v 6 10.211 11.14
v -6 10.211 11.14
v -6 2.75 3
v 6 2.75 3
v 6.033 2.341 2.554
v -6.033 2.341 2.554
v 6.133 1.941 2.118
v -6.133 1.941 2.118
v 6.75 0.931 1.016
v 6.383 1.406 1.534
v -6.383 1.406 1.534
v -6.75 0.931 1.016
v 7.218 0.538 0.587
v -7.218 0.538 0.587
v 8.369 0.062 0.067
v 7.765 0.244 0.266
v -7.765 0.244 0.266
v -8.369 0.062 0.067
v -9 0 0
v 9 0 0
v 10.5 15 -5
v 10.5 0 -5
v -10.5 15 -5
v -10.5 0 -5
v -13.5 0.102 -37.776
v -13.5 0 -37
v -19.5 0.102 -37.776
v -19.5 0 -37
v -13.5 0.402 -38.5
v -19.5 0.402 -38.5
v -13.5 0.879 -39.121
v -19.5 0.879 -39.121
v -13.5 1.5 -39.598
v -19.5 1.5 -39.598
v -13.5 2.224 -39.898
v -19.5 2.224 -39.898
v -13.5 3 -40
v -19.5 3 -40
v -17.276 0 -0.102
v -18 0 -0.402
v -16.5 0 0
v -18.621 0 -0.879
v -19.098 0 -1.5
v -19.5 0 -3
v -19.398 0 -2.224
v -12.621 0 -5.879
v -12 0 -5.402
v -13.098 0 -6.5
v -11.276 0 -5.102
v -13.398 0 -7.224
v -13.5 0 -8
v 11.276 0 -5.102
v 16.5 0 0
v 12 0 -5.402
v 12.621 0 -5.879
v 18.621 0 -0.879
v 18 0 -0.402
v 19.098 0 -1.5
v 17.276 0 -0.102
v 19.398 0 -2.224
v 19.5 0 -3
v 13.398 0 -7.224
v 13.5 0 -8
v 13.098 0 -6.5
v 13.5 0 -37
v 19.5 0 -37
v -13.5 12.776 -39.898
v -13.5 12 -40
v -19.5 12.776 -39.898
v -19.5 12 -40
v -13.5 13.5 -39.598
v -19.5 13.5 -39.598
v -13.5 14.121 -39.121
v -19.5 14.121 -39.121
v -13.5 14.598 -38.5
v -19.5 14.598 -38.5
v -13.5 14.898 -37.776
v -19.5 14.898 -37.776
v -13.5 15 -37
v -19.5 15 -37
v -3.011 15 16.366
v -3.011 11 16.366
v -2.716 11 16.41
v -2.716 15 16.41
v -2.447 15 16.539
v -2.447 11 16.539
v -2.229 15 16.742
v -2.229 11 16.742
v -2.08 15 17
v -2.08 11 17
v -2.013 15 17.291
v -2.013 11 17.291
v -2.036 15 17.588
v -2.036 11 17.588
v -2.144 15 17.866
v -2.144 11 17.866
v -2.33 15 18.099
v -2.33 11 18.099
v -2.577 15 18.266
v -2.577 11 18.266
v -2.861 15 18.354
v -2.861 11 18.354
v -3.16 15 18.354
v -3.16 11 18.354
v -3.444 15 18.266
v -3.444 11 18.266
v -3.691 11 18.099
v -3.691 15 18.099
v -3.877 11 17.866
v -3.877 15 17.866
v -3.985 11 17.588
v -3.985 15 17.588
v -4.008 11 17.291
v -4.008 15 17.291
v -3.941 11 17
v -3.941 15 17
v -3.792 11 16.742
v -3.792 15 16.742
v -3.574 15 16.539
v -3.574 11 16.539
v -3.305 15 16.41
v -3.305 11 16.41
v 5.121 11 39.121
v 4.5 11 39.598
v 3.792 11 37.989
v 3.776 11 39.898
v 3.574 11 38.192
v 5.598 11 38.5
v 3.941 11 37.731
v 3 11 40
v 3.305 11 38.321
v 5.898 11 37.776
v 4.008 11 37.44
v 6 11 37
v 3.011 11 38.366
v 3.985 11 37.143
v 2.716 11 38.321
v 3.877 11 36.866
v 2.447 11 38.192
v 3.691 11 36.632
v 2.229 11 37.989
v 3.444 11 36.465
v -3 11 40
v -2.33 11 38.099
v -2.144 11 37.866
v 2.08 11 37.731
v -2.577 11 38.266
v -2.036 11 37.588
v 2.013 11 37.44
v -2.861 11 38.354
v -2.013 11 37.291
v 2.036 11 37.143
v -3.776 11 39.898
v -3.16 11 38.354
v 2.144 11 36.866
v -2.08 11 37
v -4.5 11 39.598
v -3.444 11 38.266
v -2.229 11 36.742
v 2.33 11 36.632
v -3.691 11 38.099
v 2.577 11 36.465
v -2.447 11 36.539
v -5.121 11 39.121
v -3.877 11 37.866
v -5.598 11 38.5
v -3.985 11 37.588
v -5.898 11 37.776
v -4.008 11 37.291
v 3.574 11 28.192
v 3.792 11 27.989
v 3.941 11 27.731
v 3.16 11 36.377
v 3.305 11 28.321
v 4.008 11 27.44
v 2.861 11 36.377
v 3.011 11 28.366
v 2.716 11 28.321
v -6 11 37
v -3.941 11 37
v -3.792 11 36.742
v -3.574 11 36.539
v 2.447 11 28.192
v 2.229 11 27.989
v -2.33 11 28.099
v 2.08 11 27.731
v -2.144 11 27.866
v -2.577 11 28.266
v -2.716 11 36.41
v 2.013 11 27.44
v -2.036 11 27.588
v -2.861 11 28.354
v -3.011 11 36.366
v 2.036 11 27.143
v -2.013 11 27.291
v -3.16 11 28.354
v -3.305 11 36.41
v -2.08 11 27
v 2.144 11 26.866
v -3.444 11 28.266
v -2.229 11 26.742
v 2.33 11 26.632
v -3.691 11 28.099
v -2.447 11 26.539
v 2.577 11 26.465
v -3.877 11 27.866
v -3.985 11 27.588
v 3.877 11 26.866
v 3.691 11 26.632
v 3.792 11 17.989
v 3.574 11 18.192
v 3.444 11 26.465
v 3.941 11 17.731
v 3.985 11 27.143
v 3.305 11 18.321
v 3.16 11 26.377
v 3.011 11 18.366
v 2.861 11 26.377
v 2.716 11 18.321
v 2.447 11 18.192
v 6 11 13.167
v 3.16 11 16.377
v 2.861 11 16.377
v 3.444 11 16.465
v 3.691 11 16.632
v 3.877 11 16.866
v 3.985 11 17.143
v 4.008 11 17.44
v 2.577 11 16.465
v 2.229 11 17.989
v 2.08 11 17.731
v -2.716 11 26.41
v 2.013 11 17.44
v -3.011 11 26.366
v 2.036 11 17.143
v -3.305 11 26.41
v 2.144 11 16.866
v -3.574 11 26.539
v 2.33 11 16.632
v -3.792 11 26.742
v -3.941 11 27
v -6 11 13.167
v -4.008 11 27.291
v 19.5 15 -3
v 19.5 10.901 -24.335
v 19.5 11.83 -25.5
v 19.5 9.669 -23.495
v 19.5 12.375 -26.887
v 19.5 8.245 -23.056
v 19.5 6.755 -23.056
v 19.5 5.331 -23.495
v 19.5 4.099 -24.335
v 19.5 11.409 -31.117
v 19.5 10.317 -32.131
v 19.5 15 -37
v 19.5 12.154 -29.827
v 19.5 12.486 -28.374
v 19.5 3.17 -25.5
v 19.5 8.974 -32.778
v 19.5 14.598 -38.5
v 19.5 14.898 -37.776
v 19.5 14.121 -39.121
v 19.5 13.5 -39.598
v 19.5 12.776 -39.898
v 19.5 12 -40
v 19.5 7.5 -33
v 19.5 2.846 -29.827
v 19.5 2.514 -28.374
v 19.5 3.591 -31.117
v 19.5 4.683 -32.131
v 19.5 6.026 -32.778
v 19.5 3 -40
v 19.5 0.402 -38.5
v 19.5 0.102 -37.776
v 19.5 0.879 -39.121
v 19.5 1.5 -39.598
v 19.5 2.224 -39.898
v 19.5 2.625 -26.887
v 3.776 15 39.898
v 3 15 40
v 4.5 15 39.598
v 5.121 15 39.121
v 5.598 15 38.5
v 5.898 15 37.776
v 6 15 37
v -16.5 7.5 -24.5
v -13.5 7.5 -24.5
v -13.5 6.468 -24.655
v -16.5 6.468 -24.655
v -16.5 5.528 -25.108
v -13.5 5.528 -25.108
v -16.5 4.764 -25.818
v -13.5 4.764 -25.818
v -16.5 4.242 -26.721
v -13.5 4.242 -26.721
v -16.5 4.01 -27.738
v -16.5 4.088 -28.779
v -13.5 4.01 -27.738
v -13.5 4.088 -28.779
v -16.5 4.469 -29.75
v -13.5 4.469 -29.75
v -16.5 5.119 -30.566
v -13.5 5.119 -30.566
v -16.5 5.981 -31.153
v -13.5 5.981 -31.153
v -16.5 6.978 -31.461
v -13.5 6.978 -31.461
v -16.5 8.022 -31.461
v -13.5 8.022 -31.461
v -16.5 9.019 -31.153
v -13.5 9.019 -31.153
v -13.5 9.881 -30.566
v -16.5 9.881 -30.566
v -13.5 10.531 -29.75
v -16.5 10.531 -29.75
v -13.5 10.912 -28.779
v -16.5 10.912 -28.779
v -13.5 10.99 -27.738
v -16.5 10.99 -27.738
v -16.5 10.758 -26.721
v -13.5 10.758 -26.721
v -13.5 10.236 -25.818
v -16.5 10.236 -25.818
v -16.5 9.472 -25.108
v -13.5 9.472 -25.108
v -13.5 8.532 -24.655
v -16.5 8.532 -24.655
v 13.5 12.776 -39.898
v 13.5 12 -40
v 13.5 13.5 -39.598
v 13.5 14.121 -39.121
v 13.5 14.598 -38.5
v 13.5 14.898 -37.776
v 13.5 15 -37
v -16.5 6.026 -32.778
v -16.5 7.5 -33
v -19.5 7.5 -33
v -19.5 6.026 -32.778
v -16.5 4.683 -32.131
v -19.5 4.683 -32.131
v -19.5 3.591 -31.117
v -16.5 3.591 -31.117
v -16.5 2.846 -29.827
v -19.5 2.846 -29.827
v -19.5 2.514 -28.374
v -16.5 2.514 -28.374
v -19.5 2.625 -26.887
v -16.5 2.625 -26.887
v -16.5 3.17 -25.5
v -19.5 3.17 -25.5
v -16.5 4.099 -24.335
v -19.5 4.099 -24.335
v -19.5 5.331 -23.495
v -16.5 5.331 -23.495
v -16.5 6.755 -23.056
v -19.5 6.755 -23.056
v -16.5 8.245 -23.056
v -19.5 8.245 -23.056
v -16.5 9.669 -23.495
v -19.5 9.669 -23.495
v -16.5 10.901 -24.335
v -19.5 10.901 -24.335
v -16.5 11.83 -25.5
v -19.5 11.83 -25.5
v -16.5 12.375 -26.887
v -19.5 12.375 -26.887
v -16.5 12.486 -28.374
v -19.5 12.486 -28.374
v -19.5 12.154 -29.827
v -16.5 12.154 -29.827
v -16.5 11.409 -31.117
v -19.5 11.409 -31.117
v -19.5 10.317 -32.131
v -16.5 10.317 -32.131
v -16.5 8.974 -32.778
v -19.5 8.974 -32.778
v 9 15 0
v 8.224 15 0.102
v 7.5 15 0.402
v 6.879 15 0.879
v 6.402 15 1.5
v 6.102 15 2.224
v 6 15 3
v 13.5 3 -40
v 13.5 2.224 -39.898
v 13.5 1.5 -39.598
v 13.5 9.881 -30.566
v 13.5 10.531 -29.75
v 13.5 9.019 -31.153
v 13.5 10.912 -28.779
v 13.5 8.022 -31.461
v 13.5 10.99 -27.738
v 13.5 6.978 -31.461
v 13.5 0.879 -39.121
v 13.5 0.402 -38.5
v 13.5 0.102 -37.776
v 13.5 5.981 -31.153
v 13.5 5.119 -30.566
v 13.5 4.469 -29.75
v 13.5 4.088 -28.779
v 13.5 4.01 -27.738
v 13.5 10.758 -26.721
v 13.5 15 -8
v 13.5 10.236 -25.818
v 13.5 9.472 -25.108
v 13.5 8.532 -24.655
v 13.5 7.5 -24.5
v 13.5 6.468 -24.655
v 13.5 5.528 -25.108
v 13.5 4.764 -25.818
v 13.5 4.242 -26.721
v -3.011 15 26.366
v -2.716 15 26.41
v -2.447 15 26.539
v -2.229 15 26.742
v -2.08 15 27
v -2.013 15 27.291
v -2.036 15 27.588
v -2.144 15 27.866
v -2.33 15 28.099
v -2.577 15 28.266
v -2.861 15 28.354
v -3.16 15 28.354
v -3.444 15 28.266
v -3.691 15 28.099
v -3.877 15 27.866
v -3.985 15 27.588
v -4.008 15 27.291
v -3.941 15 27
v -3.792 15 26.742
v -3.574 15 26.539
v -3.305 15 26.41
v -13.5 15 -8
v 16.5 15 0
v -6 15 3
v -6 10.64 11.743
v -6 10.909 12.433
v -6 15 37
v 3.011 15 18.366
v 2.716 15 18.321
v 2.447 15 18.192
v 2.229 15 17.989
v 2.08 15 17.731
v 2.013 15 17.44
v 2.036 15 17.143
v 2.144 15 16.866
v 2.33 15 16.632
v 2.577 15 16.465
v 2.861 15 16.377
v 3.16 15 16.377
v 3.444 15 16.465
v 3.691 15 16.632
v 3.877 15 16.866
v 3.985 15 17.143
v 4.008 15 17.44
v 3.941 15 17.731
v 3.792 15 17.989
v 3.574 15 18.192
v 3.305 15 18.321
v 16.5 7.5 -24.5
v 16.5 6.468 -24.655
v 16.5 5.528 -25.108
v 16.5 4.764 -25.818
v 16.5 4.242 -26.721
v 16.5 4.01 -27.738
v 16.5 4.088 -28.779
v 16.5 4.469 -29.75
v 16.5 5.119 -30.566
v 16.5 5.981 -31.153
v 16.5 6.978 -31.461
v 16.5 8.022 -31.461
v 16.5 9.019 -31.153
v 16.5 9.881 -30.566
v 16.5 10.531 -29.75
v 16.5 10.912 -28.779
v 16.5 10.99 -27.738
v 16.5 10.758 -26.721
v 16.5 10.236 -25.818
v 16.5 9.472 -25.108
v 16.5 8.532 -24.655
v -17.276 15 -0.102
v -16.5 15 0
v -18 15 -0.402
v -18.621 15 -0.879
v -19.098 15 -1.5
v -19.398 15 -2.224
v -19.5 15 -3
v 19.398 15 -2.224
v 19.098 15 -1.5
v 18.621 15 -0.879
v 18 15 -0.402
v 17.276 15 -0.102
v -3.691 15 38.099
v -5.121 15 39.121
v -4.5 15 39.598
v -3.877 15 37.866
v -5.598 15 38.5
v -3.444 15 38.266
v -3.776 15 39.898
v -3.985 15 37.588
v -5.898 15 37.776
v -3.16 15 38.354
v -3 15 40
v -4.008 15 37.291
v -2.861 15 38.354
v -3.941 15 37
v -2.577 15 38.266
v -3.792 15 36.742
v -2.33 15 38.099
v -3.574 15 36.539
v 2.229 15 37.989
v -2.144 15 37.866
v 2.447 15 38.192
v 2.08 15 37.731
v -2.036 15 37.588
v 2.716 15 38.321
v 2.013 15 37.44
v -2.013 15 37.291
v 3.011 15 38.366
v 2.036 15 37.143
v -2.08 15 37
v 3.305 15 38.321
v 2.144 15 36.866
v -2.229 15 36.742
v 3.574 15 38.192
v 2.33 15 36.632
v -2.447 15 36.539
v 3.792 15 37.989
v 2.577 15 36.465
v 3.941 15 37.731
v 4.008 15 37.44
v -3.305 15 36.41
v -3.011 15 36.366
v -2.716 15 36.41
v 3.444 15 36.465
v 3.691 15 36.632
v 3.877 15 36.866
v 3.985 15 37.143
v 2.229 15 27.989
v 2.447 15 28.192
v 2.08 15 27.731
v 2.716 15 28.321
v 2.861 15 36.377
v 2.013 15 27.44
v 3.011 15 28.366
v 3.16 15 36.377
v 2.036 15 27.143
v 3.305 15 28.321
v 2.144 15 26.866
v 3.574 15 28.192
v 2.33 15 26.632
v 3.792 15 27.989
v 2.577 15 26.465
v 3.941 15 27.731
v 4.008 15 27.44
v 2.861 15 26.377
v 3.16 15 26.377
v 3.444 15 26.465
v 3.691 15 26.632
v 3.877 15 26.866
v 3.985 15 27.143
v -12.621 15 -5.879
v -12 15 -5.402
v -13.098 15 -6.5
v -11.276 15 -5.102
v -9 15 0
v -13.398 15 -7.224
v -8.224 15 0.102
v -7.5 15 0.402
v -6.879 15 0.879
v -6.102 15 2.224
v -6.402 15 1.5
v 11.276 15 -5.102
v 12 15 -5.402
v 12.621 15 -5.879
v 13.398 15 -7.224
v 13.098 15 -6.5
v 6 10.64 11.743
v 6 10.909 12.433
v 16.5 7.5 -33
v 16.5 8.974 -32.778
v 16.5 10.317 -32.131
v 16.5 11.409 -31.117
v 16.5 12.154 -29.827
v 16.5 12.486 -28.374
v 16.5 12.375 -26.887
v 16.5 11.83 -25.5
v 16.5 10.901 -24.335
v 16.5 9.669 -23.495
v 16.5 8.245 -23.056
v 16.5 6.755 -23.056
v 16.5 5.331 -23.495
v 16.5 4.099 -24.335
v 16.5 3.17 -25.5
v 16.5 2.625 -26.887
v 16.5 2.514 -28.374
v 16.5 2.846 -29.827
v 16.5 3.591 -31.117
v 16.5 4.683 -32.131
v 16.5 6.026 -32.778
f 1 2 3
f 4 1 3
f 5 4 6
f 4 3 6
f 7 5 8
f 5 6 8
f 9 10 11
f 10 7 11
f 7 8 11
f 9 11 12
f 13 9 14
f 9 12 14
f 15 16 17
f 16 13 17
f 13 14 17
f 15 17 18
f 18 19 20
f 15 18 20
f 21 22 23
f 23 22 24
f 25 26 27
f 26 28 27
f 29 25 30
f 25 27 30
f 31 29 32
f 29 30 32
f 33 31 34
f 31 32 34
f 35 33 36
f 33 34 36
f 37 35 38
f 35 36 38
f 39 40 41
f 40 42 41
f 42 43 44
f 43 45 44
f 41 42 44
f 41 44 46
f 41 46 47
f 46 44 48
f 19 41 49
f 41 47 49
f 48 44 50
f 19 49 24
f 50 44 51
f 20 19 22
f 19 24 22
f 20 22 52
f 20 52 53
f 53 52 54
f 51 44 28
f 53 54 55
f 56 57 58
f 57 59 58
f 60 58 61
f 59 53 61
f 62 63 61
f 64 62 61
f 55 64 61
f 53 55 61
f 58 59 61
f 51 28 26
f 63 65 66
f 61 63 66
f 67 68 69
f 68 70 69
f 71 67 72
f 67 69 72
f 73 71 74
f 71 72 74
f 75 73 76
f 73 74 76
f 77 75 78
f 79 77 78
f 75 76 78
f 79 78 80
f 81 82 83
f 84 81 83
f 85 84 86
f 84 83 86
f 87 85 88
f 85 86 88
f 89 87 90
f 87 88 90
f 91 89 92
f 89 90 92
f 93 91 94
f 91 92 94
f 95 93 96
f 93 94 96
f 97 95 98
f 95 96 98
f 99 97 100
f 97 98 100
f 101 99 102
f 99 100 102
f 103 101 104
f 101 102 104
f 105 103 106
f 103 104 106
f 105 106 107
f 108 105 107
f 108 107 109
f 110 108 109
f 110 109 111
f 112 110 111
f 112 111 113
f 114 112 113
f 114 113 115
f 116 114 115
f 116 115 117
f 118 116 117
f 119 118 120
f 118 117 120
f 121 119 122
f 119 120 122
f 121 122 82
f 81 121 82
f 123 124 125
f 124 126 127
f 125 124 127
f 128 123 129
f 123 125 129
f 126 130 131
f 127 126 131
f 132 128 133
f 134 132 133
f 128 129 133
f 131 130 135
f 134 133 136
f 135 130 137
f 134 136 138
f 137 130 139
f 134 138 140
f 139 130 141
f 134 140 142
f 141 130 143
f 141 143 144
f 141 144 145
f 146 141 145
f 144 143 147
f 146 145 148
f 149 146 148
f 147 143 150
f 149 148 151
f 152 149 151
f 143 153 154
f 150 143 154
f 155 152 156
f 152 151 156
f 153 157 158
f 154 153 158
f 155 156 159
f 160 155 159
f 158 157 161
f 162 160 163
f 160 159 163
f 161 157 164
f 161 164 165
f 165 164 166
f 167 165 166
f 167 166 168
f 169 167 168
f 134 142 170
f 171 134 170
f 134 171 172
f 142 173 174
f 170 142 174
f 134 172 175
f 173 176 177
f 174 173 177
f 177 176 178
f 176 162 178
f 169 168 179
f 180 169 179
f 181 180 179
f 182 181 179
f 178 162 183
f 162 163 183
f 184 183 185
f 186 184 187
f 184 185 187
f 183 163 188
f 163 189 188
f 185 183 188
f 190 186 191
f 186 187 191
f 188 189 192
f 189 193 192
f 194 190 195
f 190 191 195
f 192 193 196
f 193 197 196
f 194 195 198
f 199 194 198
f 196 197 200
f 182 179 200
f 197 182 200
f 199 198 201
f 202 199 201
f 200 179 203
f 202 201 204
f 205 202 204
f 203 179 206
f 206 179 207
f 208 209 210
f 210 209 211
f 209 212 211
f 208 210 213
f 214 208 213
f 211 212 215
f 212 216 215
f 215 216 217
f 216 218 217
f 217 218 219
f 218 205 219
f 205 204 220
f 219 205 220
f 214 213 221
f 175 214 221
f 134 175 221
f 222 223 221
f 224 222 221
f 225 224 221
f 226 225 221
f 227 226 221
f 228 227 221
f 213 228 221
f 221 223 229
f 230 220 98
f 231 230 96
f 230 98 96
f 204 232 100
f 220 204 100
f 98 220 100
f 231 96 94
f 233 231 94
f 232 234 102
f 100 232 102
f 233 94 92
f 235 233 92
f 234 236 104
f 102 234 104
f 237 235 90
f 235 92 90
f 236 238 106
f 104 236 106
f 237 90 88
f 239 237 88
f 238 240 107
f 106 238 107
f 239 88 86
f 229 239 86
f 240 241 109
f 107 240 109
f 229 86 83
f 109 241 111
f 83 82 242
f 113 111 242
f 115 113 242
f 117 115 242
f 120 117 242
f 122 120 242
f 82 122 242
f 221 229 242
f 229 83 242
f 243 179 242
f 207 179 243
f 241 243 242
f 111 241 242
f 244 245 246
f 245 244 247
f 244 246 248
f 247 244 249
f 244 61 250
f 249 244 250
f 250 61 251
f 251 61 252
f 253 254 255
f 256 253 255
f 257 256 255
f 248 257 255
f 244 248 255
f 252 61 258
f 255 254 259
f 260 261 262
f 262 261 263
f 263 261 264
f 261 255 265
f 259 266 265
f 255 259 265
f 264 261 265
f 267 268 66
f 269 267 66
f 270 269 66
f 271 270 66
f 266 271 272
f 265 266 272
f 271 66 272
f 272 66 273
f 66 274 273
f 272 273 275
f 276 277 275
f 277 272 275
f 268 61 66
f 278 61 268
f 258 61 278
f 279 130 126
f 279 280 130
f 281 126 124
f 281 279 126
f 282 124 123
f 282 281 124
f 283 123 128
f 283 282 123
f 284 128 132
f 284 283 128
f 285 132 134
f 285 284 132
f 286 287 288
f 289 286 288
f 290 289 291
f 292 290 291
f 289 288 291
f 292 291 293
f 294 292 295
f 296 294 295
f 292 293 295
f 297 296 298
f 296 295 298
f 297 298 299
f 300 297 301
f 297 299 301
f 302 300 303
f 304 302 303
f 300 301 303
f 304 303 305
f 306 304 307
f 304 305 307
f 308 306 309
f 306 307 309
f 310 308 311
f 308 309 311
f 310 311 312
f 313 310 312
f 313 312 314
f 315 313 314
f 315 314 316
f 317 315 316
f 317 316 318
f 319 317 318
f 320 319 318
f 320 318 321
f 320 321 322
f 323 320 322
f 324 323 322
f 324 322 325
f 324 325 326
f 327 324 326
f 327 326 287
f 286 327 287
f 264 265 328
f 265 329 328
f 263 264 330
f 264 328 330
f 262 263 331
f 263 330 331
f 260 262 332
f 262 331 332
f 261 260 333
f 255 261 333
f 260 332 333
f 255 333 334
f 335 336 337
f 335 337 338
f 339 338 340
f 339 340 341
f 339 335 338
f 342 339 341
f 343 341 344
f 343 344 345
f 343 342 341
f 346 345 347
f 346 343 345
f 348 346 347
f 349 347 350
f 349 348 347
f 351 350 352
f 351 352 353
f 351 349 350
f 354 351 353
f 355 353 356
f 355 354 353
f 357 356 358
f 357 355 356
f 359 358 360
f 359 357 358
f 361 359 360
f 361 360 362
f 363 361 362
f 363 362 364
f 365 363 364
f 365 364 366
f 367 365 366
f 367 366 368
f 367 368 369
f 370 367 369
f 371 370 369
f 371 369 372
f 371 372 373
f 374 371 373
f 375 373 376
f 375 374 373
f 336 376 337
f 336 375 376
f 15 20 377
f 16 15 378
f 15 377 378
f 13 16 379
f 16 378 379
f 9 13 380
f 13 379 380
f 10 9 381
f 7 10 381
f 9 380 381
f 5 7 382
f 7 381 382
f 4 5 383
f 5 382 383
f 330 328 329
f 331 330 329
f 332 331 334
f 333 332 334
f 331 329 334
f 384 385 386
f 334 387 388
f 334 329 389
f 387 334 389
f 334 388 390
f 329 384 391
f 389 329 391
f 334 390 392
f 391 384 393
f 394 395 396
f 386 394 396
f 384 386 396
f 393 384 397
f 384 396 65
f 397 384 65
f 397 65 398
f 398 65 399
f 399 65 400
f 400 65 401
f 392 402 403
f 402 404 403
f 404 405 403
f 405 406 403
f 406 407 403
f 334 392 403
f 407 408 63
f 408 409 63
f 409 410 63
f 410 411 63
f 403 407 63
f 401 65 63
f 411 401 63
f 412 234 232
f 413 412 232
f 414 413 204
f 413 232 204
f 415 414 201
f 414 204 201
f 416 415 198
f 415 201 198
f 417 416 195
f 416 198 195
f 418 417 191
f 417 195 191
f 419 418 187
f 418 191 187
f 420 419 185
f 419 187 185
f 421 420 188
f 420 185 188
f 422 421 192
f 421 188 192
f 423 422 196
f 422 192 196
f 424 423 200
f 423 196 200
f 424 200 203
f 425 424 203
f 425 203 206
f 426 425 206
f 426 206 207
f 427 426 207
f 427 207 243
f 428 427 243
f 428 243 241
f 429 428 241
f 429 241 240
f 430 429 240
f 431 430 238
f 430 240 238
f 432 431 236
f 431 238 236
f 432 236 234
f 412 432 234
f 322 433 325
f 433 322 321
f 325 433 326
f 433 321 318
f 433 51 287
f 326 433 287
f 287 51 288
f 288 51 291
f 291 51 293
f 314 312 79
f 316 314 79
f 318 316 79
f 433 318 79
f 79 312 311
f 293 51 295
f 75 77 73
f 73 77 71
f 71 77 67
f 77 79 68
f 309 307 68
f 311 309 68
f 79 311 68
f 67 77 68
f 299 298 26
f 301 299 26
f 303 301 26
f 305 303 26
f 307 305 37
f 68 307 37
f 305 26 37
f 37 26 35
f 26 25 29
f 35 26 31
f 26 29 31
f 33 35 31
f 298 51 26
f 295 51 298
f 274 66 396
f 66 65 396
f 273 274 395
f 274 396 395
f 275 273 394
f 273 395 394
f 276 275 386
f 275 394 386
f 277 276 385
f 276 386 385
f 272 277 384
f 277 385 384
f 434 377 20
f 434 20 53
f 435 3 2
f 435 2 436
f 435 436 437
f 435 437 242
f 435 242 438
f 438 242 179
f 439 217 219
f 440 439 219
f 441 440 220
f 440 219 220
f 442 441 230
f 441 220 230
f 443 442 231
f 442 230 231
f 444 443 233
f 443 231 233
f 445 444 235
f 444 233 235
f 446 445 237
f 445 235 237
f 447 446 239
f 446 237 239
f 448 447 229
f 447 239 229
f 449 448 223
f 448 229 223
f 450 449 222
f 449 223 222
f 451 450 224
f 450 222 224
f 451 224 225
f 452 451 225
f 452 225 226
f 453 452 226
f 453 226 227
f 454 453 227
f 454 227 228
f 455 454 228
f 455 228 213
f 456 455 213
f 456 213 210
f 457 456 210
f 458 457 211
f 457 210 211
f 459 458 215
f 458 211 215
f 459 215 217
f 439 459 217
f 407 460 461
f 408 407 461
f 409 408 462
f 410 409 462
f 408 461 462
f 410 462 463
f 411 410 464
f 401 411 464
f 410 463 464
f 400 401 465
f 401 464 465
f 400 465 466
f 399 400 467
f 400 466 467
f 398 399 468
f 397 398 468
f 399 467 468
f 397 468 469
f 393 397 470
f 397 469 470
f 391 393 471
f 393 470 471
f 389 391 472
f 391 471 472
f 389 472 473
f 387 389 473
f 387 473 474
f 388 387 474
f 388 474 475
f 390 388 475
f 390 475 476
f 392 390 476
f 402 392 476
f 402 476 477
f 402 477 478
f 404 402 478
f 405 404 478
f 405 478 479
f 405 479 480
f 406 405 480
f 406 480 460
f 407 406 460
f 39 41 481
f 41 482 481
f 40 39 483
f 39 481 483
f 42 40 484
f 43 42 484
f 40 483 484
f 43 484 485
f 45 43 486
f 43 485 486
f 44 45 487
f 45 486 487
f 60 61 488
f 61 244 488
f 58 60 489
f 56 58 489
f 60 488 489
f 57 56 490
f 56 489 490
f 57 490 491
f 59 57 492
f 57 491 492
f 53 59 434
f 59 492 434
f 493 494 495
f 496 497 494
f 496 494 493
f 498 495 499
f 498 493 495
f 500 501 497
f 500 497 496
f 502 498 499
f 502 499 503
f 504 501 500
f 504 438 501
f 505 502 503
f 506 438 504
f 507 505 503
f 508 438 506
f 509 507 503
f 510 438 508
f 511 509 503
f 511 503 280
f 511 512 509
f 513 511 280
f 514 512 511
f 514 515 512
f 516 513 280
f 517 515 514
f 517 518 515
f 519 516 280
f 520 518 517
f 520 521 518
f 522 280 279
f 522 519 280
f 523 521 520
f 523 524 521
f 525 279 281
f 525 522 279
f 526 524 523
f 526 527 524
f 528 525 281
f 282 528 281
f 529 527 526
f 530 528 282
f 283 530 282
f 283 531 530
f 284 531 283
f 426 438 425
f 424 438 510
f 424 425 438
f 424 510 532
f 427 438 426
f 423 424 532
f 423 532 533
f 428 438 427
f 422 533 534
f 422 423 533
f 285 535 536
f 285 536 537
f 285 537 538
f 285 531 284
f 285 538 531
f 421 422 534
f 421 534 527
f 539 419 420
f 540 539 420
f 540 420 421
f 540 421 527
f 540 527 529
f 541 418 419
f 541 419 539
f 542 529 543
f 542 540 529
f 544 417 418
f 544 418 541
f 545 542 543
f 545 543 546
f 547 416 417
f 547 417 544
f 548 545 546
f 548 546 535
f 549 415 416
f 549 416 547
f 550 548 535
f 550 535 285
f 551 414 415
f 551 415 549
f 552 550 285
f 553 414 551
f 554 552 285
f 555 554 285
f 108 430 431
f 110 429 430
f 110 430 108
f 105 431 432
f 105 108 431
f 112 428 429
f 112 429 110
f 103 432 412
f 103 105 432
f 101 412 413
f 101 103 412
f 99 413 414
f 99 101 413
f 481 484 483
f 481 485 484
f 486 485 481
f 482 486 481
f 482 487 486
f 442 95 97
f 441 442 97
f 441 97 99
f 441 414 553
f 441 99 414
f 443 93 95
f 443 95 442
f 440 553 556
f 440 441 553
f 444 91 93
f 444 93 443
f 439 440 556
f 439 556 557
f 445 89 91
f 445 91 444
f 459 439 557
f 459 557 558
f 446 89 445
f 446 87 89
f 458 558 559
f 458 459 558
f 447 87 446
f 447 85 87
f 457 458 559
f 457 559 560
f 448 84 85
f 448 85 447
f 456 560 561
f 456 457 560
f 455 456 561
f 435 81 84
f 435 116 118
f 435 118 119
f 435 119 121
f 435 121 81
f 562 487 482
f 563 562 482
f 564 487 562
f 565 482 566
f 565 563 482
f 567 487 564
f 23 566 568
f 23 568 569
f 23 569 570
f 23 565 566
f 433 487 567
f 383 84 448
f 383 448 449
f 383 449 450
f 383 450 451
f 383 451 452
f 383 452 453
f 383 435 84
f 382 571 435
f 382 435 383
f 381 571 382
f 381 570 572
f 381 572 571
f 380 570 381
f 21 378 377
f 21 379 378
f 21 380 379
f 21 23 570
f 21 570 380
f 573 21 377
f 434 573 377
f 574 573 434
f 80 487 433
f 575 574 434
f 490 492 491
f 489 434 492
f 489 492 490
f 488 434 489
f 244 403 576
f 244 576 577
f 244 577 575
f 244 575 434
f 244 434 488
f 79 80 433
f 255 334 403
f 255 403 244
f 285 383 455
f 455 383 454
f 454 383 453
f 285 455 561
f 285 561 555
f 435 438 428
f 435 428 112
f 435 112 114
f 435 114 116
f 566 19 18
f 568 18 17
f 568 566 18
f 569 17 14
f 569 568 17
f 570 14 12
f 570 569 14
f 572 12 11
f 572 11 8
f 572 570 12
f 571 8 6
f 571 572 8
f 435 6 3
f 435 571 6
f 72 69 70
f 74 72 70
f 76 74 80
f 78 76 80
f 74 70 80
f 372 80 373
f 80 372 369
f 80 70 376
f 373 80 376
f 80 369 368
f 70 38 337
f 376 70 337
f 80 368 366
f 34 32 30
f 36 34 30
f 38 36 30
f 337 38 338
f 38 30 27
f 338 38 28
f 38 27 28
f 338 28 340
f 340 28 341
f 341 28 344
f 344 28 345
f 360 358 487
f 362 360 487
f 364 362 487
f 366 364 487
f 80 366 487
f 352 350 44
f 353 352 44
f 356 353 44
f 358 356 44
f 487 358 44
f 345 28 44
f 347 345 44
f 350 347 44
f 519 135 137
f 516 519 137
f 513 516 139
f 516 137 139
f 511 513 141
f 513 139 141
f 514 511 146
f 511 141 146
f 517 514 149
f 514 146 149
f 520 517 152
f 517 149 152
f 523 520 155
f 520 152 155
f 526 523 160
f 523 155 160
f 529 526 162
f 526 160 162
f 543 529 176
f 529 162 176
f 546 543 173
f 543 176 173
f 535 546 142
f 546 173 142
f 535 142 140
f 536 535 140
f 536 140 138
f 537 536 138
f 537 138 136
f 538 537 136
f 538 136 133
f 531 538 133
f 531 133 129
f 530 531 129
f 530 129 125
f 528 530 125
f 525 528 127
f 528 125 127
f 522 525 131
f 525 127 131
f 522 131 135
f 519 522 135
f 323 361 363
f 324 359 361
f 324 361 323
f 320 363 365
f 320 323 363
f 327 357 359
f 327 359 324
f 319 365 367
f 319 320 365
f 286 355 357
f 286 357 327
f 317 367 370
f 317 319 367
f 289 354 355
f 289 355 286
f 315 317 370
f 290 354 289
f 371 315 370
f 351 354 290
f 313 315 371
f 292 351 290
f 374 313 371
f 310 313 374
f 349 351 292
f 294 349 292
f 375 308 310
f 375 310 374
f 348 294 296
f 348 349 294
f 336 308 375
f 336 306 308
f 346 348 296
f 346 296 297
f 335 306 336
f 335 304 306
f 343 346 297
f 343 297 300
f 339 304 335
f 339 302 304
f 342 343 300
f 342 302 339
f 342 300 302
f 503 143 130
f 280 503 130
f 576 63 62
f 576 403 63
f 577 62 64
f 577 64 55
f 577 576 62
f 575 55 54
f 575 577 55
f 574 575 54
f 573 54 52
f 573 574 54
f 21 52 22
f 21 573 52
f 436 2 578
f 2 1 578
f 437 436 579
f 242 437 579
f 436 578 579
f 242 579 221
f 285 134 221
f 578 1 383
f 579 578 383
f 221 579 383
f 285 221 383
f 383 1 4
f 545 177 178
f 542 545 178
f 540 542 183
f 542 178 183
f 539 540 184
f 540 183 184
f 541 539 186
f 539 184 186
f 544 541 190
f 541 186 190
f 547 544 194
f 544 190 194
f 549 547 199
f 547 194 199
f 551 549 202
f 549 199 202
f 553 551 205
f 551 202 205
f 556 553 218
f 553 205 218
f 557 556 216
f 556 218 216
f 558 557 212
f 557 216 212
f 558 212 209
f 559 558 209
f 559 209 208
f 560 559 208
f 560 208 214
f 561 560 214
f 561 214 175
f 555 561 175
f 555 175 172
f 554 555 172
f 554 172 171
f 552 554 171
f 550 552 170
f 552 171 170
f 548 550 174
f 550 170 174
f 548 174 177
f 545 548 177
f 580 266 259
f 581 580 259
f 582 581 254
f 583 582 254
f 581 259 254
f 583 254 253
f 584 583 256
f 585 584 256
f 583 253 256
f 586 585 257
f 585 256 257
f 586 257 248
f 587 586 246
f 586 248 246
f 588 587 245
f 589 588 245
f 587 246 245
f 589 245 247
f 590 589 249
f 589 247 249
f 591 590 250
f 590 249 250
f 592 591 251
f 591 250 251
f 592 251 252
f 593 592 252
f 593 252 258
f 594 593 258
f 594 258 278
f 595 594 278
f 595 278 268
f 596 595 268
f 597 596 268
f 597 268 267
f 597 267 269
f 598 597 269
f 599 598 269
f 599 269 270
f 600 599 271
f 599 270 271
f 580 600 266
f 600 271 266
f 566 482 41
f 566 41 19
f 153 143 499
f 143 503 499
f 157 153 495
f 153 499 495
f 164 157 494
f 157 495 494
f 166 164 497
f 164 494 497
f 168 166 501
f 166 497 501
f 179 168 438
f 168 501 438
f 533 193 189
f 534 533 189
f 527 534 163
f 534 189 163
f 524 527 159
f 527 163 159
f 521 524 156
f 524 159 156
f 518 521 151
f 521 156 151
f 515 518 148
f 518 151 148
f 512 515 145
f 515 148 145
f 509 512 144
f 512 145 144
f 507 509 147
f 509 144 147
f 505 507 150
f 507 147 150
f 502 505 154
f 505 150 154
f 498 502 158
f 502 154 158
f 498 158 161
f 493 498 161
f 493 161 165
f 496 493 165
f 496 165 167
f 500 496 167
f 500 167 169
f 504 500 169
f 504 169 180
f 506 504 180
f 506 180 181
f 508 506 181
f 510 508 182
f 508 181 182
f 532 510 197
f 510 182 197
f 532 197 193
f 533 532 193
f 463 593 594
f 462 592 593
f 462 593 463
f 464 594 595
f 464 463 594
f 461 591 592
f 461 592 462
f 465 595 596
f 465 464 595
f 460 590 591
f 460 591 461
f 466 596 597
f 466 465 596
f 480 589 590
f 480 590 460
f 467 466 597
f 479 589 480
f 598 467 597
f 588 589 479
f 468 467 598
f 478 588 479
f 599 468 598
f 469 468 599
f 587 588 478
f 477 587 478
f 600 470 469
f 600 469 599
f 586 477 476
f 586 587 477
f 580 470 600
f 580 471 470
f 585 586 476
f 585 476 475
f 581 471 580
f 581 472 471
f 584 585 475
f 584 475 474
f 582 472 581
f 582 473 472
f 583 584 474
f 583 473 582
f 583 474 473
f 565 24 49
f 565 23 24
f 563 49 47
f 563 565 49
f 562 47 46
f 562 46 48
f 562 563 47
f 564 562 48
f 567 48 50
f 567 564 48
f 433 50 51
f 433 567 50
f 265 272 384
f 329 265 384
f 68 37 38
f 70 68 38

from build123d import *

# Parameters (mm, degrees)
BOSS_EXTRUDE1_DEPTH = 15
SKETCH3_R           = 5
CUT_EXTRUDE1_DEPTH  = 3
CUT_EXTRUDE2_START  = -3
SKETCH4_R           = 5
CUT_EXTRUDE2_DEPTH  = 3
SKETCH5_R           = 3.5
CUT_EXTRUDE3_DEPTH  = 64
CUT_EXTRUDE4_DEPTH  = 15
FILLET2_R           = 3
FILLET3_R           = 3
FILLET5_R           = 3
FILLET6_R           = 3
SKETCH7_R           = 1
CUT_EXTRUDE5_DEPTH  = 4


with BuildPart() as part:
    # Sketch2 → Boss-Extrude1 (new body)
    with BuildSketch(Plane(origin=(0, 0, 0), x_dir=(1, 0, 0), z_dir=(0, 1, 0))):
        Polygon((-6, -40), (6, -40), (6, 0), (19.5, 0), (19.5, 40), (13.5, 40), (13.5, 5), (-13.5, 5), (-13.5, 40), (-19.5, 40), (-19.5, 0), (-6, 0), align=None)
    extrude(amount=BOSS_EXTRUDE1_DEPTH)

    # Sketch3 → Cut-Extrude1 (cut)
    with BuildSketch(Plane(origin=(19.5, 0, 0), x_dir=(0, 0, -1), z_dir=(1, 0, 0))):
        with Locations((28, 7.5)):
            Circle(SKETCH3_R)
    extrude(amount=-CUT_EXTRUDE1_DEPTH, mode=Mode.SUBTRACT)

    # Sketch4 → Cut-Extrude2 (cut)
    with BuildSketch(Plane.ZY.offset(19.5).offset(CUT_EXTRUDE2_START)):
        with Locations(Location((-28, 7.5, 0), (0, 0, 180))):
            Circle(SKETCH4_R)
    extrude(amount=CUT_EXTRUDE2_DEPTH, mode=Mode.SUBTRACT)

    # Sketch5 → Cut-Extrude3 (cut)
    with BuildSketch(Plane(origin=(16.5, 0, 0), x_dir=(0, 0, -1), z_dir=(1, 0, 0))):
        with Locations(Location((28, 7.5, 0), (0, 0, 180))):
            Circle(SKETCH5_R)
    extrude(amount=-CUT_EXTRUDE3_DEPTH, mode=Mode.SUBTRACT)

    # Sketch6 → Cut-Extrude4 (cut)
    with BuildSketch(Plane.ZY.offset(6)):
        Polygon((40, 0), (40, 11), (12, 11), (0, 0), align=None)
    extrude(amount=-CUT_EXTRUDE4_DEPTH, mode=Mode.SUBTRACT)

    # Fillet2
    fillet2_edges = [part.edges().sort_by_distance(p)[0] for p in [
        (-16.5, 0, -40),
        (16.5, 0, -40),
        (16.5, 15, -40),
        (-16.5, 15, -40),
    ]]
    fillet(fillet2_edges, radius=FILLET2_R)

    # Fillet3
    fillet3_edges = [part.edges().sort_by_distance(p)[0] for p in [
        (-19.5, 7.5, 0),
        (-13.5, 7.5, -5),
        (13.5, 7.5, -5),
        (19.5, 7.5, 0),
    ]]
    fillet(fillet3_edges, radius=FILLET3_R)

    # Fillet5
    fillet5_edges = [part.edges().sort_by_distance(p)[0] for p in [
        (6, 7.5, 0),
        (-6, 7.5, 0),
        (0, 11, 12),
    ]]
    fillet(fillet5_edges, radius=FILLET5_R)

    # Fillet6
    fillet6_edges = [part.edges().sort_by_distance(p)[0] for p in [
        (6, 13, 40),
        (-6, 13, 40),
    ]]
    fillet(fillet6_edges, radius=FILLET6_R)

    # Sketch7 → Cut-Extrude5 (cut)
    with BuildSketch(Plane.XZ.offset(-11)):
        with Locations(Location((-3.010508875, 37.365518676, 0), (0, 0, 270))):
            Circle(SKETCH7_R)
        with Locations(Location((-3.010508875, 27.365518676, 0), (0, 0, 270))):
            Circle(SKETCH7_R)
        with Locations(Location((-3.010508875, 17.365518676, 0), (0, 0, 270))):
            Circle(SKETCH7_R)
        with Locations(Location((3.010508875, 17.365518676, 0), (0, 0, 90))):
            Circle(SKETCH7_R)
        with Locations(Location((3.010508875, 27.365518676, 0), (0, 0, 90))):
            Circle(SKETCH7_R)
        with Locations(Location((3.010508875, 37.365518676, 0), (0, 0, 90))):
            Circle(SKETCH7_R)
    extrude(amount=-CUT_EXTRUDE5_DEPTH, mode=Mode.SUBTRACT)


solid = part.part
